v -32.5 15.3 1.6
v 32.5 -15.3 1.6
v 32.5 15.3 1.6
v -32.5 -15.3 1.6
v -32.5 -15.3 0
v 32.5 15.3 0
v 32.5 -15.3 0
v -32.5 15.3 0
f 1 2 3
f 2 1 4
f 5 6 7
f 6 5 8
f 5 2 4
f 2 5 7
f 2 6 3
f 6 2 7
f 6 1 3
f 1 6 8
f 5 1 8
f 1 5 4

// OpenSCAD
$fn = 64;

board_x = 65.0;
board_y = 30.6;
board_th = 1.6;

color([0.05, 0.45, 0.12])
translate([-board_x/2, -board_y/2, 0])
cube([board_x, board_y, board_th], center=false);
